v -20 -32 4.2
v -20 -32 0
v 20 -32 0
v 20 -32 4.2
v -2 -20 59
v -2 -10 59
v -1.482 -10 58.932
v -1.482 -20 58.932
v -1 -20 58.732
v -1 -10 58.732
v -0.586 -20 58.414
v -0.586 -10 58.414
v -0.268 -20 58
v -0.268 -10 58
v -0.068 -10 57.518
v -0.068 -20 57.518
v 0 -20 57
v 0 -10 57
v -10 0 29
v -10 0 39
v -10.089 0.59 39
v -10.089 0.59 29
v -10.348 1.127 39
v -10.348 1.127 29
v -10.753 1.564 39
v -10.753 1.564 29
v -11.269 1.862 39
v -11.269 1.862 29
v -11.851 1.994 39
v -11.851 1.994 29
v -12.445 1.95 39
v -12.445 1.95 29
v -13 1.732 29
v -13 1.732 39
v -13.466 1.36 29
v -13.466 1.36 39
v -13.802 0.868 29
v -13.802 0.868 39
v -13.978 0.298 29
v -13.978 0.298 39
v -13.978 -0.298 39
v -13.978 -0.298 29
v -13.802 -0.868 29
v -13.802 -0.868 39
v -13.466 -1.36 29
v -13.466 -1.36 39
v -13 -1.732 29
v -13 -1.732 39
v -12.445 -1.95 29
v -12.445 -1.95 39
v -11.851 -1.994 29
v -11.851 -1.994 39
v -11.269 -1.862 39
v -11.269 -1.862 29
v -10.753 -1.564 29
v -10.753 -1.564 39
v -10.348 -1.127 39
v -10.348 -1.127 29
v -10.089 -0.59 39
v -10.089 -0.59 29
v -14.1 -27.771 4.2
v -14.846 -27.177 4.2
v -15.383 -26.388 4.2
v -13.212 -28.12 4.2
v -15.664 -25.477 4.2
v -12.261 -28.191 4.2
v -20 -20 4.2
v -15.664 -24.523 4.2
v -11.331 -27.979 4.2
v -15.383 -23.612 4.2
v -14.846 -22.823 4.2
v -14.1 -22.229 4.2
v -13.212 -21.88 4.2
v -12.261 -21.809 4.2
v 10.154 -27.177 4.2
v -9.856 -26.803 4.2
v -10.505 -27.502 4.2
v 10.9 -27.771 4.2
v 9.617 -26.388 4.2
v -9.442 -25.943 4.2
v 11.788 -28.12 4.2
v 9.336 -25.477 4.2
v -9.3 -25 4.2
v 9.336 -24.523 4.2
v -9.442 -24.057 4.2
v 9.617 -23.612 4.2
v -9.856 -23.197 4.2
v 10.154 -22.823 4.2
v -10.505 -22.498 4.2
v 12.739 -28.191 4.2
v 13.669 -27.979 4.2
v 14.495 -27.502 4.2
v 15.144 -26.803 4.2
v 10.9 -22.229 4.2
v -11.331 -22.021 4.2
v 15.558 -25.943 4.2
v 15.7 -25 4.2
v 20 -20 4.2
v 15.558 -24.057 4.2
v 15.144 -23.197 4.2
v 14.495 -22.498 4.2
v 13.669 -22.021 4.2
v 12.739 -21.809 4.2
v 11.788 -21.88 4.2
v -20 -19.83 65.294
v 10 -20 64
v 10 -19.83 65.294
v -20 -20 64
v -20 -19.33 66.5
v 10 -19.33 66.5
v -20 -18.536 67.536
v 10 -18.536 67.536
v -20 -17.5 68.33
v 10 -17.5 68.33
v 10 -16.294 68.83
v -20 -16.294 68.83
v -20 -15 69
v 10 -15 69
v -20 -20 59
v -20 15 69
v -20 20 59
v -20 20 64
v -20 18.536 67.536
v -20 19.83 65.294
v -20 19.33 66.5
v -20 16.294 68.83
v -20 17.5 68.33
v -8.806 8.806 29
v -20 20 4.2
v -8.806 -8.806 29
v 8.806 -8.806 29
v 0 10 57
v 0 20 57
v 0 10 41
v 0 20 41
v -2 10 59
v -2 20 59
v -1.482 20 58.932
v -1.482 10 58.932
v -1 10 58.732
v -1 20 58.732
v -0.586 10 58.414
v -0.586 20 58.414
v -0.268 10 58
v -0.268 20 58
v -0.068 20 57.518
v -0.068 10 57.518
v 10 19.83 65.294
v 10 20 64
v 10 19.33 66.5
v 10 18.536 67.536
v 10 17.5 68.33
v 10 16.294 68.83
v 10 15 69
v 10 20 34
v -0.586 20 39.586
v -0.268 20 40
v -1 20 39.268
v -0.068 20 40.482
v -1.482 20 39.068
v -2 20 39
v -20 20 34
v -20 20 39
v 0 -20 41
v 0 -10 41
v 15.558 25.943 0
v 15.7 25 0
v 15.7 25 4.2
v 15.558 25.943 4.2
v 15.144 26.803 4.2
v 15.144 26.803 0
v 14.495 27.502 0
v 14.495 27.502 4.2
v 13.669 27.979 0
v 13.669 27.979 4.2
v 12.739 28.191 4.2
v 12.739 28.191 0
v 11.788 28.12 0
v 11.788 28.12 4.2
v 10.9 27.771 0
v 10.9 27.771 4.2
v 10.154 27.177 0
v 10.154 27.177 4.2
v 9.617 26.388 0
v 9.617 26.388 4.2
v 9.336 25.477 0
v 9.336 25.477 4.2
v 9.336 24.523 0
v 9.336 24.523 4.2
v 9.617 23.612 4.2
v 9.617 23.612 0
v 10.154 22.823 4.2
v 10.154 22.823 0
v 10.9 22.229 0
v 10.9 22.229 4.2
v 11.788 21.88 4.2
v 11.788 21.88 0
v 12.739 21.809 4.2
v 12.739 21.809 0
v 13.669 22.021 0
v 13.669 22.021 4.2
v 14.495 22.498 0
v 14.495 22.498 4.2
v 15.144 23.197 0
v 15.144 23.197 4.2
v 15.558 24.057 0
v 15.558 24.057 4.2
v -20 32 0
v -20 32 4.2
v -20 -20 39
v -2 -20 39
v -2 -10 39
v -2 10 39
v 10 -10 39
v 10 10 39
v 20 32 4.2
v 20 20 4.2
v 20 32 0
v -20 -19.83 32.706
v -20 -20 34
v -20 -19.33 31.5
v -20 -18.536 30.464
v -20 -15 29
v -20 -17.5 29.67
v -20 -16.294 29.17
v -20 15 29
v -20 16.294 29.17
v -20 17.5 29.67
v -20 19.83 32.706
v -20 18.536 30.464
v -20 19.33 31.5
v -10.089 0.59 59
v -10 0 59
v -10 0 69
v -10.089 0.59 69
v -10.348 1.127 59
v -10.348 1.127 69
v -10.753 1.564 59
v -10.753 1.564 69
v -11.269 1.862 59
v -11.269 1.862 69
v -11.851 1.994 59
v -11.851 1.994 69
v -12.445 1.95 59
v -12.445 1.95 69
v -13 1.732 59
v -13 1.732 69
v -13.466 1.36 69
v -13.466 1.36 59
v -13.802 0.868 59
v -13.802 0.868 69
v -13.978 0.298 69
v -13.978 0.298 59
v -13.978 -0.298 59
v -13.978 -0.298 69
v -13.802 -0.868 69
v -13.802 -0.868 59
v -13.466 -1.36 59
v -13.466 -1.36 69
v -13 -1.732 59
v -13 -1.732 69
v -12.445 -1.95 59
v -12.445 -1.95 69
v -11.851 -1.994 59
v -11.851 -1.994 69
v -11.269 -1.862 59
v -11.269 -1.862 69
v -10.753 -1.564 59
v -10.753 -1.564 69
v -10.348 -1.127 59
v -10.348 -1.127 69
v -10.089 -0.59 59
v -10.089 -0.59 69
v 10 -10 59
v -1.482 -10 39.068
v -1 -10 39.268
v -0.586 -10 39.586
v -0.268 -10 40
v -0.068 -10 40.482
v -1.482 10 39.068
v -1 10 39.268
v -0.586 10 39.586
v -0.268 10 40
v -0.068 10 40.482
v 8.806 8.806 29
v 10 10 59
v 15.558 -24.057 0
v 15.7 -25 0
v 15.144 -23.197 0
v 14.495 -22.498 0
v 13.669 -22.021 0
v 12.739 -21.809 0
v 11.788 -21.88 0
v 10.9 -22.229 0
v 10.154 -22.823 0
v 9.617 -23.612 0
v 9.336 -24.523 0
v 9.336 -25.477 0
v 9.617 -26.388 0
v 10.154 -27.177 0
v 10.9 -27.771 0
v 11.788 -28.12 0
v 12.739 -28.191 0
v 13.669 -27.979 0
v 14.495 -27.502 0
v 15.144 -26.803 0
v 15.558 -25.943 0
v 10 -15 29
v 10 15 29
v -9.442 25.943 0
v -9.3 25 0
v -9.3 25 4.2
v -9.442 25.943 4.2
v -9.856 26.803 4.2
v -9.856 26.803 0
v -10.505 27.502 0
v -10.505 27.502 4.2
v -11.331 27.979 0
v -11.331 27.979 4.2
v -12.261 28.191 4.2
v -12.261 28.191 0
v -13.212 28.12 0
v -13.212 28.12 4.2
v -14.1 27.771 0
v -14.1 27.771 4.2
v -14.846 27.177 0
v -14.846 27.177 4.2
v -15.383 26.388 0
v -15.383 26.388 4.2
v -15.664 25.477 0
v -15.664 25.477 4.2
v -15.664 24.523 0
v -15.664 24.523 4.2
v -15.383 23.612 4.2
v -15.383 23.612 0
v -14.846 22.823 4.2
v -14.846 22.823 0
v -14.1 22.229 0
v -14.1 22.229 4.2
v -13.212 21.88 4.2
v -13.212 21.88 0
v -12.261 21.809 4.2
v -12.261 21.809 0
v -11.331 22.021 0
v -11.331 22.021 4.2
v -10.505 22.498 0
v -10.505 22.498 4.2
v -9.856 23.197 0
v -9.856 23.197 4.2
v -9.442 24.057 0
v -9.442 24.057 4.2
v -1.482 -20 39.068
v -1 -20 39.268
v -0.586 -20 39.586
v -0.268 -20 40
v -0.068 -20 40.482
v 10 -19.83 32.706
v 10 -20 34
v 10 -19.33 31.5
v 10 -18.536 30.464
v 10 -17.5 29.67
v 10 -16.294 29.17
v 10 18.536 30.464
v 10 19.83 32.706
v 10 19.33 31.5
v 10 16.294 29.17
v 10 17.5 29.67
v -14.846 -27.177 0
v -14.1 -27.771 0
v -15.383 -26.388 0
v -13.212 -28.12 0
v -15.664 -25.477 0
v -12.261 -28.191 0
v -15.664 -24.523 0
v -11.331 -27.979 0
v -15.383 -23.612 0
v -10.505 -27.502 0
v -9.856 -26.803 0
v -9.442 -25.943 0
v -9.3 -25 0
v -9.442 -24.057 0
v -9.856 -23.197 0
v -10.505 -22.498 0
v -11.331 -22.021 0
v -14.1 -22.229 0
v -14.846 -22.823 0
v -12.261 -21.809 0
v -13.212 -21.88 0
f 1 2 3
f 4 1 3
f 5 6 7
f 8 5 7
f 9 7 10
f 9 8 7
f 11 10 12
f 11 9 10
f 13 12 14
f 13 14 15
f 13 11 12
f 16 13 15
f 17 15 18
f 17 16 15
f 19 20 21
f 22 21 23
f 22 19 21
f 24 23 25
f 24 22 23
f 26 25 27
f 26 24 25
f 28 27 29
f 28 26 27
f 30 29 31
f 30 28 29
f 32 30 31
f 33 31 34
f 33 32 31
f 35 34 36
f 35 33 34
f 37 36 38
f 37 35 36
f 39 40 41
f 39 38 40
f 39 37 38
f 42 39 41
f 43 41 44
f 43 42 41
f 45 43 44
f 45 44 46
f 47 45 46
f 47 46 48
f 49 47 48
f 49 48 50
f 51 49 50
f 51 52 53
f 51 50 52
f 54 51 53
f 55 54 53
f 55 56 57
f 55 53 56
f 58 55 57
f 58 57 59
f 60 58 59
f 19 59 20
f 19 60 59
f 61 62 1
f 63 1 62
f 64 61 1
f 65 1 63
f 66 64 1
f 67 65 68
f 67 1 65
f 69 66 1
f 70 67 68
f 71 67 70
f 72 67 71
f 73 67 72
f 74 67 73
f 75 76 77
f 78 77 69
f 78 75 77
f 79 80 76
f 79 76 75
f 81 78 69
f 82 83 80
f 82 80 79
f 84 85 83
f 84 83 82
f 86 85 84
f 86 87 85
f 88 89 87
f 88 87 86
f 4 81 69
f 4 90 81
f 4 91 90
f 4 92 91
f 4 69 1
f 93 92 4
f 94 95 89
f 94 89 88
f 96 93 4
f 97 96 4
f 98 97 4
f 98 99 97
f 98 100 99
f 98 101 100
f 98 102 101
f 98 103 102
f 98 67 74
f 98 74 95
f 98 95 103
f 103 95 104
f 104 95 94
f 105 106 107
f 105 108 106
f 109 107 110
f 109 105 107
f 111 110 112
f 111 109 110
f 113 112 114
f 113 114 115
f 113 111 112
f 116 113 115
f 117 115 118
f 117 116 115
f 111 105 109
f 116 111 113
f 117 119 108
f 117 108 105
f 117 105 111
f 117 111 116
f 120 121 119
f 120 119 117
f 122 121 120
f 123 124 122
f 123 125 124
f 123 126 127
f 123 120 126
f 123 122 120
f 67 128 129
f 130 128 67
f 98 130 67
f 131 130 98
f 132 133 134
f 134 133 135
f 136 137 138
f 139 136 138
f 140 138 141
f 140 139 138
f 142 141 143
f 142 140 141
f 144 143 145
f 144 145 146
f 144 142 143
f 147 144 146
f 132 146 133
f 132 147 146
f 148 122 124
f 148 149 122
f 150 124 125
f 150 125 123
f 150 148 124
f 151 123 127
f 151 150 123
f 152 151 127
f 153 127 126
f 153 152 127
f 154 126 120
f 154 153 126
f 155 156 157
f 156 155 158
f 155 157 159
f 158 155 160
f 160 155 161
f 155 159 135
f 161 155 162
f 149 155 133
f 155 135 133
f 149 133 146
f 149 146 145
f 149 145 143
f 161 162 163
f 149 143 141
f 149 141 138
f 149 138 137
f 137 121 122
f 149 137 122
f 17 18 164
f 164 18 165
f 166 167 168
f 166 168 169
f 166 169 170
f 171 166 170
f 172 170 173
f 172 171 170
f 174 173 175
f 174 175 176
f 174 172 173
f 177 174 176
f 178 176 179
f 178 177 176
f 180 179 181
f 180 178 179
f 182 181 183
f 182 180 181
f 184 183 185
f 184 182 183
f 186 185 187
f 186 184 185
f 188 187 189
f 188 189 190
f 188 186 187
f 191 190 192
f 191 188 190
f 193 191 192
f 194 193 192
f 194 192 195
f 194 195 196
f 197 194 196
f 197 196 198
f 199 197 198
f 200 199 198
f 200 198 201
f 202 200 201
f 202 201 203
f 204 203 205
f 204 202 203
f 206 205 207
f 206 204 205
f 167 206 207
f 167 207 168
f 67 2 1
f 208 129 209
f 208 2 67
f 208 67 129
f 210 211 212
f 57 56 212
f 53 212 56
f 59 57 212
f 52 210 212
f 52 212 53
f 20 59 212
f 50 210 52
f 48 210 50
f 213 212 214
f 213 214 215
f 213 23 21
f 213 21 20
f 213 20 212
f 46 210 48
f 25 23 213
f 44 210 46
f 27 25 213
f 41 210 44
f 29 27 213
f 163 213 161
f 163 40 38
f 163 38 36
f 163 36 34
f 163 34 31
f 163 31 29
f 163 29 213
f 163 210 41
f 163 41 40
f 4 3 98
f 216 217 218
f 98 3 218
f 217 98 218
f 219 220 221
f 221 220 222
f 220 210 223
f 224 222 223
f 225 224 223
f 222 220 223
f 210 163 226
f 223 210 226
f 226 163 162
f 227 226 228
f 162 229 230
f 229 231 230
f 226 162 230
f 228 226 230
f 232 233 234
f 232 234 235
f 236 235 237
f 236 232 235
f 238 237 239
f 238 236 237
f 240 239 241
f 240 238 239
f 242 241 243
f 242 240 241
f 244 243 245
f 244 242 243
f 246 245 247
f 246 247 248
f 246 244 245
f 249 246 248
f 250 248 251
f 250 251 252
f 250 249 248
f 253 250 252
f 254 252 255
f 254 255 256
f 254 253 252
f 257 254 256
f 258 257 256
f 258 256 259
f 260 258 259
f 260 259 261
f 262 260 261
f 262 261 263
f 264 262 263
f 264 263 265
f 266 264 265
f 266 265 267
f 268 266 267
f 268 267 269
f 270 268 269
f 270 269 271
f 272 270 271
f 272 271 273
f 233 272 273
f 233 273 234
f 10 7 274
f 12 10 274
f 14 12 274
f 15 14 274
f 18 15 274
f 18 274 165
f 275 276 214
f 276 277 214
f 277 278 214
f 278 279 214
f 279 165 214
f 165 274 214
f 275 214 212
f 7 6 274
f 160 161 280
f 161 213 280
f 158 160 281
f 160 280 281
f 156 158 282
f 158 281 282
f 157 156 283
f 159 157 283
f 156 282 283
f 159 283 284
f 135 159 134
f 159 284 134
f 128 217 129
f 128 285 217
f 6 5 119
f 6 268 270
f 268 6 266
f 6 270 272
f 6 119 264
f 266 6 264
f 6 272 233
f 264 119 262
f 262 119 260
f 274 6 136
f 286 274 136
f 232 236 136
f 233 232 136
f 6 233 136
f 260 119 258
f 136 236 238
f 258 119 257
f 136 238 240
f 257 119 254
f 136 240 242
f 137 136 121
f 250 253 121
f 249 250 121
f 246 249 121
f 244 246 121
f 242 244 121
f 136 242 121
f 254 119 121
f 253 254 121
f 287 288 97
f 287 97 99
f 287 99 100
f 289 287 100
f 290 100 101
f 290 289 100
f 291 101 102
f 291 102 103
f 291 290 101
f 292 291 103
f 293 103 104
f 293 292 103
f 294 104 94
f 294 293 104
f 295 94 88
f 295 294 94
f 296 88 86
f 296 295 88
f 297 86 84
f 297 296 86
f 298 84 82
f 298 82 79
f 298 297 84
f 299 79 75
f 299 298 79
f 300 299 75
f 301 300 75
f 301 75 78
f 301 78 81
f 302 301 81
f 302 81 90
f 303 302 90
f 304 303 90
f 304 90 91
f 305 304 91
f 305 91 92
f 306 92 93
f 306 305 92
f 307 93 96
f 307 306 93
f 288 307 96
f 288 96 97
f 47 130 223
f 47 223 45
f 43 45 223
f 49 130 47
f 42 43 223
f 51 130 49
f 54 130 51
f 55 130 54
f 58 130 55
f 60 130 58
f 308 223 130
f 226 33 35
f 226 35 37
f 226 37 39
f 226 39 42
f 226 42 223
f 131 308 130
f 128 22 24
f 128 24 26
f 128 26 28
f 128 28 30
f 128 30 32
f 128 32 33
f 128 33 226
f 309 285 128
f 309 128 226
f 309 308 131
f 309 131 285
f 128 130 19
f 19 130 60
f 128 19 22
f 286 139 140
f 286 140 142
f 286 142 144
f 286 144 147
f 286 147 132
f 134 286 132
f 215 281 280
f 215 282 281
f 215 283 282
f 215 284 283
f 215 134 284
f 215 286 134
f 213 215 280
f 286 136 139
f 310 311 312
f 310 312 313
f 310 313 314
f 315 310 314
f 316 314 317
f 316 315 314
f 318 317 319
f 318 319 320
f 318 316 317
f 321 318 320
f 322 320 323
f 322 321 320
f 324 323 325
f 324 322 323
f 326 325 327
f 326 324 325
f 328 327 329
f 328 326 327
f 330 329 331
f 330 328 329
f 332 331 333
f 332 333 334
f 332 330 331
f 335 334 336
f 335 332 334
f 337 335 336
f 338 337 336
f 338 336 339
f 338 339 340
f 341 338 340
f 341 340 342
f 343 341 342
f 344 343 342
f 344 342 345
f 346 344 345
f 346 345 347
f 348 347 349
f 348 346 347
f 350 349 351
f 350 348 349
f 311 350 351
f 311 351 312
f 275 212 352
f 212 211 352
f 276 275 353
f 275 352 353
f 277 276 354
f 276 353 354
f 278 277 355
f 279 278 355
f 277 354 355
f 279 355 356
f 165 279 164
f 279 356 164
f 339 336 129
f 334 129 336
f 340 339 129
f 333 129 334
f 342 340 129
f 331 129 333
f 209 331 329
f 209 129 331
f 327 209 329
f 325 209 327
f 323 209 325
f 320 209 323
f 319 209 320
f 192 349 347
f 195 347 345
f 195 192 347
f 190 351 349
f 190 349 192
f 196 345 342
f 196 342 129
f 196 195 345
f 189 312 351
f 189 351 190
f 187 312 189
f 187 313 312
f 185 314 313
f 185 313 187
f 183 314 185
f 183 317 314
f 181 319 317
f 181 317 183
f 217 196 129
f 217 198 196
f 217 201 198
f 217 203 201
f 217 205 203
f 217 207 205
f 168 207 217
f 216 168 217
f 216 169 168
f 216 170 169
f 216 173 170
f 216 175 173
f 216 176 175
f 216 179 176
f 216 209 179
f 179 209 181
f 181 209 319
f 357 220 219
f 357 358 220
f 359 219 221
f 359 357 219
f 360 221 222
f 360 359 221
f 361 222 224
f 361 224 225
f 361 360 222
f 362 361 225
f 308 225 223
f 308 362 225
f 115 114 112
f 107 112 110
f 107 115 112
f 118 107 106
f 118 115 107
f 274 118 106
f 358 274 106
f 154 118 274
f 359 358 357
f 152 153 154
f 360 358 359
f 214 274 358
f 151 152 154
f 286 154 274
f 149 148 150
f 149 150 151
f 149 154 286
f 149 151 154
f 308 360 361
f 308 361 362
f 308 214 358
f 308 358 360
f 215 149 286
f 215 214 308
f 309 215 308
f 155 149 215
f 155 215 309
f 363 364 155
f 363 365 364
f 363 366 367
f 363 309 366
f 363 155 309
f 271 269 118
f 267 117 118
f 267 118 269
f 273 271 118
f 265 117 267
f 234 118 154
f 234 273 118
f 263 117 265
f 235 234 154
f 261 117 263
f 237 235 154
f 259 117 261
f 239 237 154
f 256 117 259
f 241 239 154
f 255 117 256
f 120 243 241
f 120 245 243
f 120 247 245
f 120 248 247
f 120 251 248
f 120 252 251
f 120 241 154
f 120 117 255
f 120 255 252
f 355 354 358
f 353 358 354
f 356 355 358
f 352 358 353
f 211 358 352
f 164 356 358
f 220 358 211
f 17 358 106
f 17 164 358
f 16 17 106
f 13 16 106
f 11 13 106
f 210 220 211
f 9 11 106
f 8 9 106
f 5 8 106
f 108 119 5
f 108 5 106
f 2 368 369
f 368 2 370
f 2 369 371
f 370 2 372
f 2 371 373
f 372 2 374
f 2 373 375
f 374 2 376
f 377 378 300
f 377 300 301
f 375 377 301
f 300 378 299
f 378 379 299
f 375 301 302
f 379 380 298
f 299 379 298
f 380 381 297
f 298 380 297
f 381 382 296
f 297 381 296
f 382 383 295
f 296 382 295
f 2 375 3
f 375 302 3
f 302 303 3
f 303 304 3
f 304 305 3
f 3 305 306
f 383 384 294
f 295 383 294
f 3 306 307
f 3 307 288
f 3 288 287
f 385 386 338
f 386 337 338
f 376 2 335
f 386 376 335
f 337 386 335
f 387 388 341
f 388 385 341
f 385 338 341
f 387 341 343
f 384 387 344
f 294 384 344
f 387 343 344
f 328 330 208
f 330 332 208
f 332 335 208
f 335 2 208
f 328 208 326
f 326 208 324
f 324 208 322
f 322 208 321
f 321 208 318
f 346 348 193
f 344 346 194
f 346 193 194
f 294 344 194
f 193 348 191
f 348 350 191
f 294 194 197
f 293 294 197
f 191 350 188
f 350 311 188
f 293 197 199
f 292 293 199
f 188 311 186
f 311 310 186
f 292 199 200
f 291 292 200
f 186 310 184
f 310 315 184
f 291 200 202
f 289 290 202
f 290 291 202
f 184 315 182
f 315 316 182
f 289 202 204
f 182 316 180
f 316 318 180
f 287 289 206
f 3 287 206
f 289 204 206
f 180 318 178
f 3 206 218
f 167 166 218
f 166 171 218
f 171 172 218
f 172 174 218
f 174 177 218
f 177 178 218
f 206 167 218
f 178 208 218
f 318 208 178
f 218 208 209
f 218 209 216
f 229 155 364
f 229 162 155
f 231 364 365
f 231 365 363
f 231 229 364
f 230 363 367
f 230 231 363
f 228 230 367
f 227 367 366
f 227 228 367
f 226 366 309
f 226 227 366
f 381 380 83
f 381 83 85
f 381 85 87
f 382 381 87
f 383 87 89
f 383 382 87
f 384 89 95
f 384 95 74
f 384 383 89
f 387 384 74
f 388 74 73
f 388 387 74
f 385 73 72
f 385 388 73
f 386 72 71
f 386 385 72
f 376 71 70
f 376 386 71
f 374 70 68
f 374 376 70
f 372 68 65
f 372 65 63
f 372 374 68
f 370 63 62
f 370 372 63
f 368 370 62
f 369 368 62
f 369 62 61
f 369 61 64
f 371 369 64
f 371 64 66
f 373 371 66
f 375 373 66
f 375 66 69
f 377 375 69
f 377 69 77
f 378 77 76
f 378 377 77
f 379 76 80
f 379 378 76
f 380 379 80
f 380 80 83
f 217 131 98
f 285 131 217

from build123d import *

# Parameters (mm, degrees)
SKETCH_1_W           = 40
SKETCH_1_H           = 64
SKETCH_1_R           = 3.2
EXTRUDE_1_DEPTH      = 4.2
SKETCH_2_R           = 16
SKETCH_2_W           = 20
SKETCH_2_H           = 20
EXTRUDE_2_DEPTH      = 10
EXTRUDE_2_DEPTH_BACK = 20
SKETCH_3_W           = 20
SKETCH_3_H           = 32
CUT_EXTRUDE_1_DEPTH  = 20
EXTRUDE_3_DEPTH      = 3
SKETCH_7_W           = 14
SKETCH_7_H           = 6
EXTRUDE_4_DEPTH      = 0.283766
EXTRUDE_5_DEPTH      = 3
SKETCH_9_W           = 6
SKETCH_9_H           = 14
EXTRUDE_6_DEPTH      = 1.612505
SKETCH_10_W          = 40
SKETCH_10_H          = 40
SKETCH_11_W          = 14
SKETCH_11_H          = 14
SKETCH_12_W          = 14
SKETCH_12_H          = 14
EXTRUDE_8_DEPTH      = 6
SKETCH_14_W          = 40
SKETCH_14_H          = 40
SKETCH_14_W_2        = 20
SKETCH_14_H_2        = 20
EXTRUDE_10_DEPTH     = 10
SKETCH_15_W          = 10
SKETCH_15_H          = 40
EXTRUDE_11_DEPTH     = 20
CUT_EXTRUDE_START    = -10
SKETCH_4_R           = 2
CUT_EXTRUDE_2_DEPTH  = 40
FILLET_2_R           = 5
FILLET_3_R           = 2


with BuildPart() as part:
    # 스케치1 → 보스-돌출1 (new body)
    with BuildSketch(Plane.XY):
        Rectangle(SKETCH_1_W, SKETCH_1_H)
        with Locations((-12.5, 25)):
            Circle(SKETCH_1_R, mode=Mode.SUBTRACT)
        with Locations((12.5, 25)):
            Circle(SKETCH_1_R, mode=Mode.SUBTRACT)
        with Locations((12.5, -25)):
            Circle(SKETCH_1_R, mode=Mode.SUBTRACT)
        with Locations((-12.5, -25)):
            Circle(SKETCH_1_R, mode=Mode.SUBTRACT)
    extrude(amount=EXTRUDE_1_DEPTH)

    # 스케치5 → 보스-돌출3 (add, symmetric)
    with BuildSketch(Plane(origin=(0, 0, 0), x_dir=(1, 0, 0), z_dir=(0, 1, 0))):
        Polygon((-20, -4.2), (-7, -33), (7, -33), (20, -4.2), align=None)
        Polygon((-13.805819277, -8.2), (-4, -8.2), (-4, -29.923661167), align=None, mode=Mode.SUBTRACT)
        Polygon((4, -29.923661167), (13.805819277, -8.2), (4, -8.2), align=None, mode=Mode.SUBTRACT)
    extrude(amount=EXTRUDE_3_DEPTH, both=True)



with BuildPart() as body_2:
    # 스케치2 → 보스-돌출2 (new body, two sides)
    with BuildSketch(Plane(origin=(0, 0, 0), x_dir=(0, 0, -1), z_dir=(1, 0, 0))) as extrude_2_sk:
        with Locations((-49, 0)):
            Circle(SKETCH_2_R)
        with Locations((-49, 0)):
            Rectangle(SKETCH_2_W, SKETCH_2_H, mode=Mode.SUBTRACT)
    extrude(amount=EXTRUDE_2_DEPTH)
    extrude(extrude_2_sk.sketch, amount=-EXTRUDE_2_DEPTH_BACK)

    # 스케치3 → 컷-돌출1 (cut)
    with BuildSketch(Plane.ZY.offset(20)):
        with Locations((49, 0)):
            Rectangle(SKETCH_3_W, SKETCH_3_H)
    extrude(amount=-CUT_EXTRUDE_1_DEPTH, mode=Mode.SUBTRACT)


with BuildPart() as part_1:
    add(part.part)

    add(body_2.part)  # 보스-돌출4 merges body 2
    # 스케치7 → 보스-돌출4 (add)
    with BuildSketch(Plane.XY.offset(33)):
        Rectangle(SKETCH_7_W, SKETCH_7_H)
    extrude(amount=EXTRUDE_4_DEPTH)

    # 스케치8 → 보스-돌출5 (add, symmetric)
    with BuildSketch(Plane(origin=(0, 0, 0), x_dir=(0, 0, -1), z_dir=(1, 0, 0))):
        Polygon((-4.2, 20), (-33, 7), (-33, -7), (-4.2, -20), align=None)
        Polygon((-8.2, 13.805819277), (-8.2, 4), (-29.923661167, 4), align=None, mode=Mode.SUBTRACT)
        Polygon((-8.2, -4), (-29.923661167, -4), (-8.2, -13.805819277), align=None, mode=Mode.SUBTRACT)
    extrude(amount=EXTRUDE_5_DEPTH, both=True)

    # 스케치9 → 보스-돌출6 (add)
    with BuildSketch(Plane.XY.offset(33)):
        Rectangle(SKETCH_9_W, SKETCH_9_H)
    extrude(amount=EXTRUDE_6_DEPTH)

    # 스케치10 → 로프트1 section 0
    with BuildSketch(Plane.XY.offset(4.2)):
        Rectangle(SKETCH_10_W, SKETCH_10_H)
    # 스케치11 → 로프트1 section 1
    with BuildSketch(Plane.XY.offset(33)):
        Rectangle(SKETCH_11_W, SKETCH_11_H)
    loft()

    # 스케치12 → 보스-돌출8 (add)
    with BuildSketch(Plane.XY.offset(33)):
        Rectangle(SKETCH_12_W, SKETCH_12_H)
    extrude(amount=EXTRUDE_8_DEPTH)

    # 스케치14 → 보스-돌출10 (add)
    with BuildSketch(Plane(origin=(10, 0, 0), x_dir=(0, 0, -1), z_dir=(1, 0, 0))):
        with Locations((-49, 0)):
            Rectangle(SKETCH_14_W, SKETCH_14_H)
        with Locations((-49, 0)):
            Rectangle(SKETCH_14_W_2, SKETCH_14_H_2, mode=Mode.SUBTRACT)
    extrude(amount=-EXTRUDE_10_DEPTH)

    # 스케치15 → 보스-돌출11 (add)
    with BuildSketch(Plane.ZY.offset(20)):
        with Locations((64, 0)):
            Rectangle(SKETCH_15_W, SKETCH_15_H)
        with Locations((34, 0)):
            Rectangle(SKETCH_15_W, SKETCH_15_H)
    extrude(amount=-EXTRUDE_11_DEPTH)

    # 스케치4 → 컷-돌출2 (cut)
    with BuildSketch(Plane.XY.offset(39).offset(CUT_EXTRUDE_START)):
        with Locations((-12, 0)):
            Circle(SKETCH_4_R)
    extrude(amount=CUT_EXTRUDE_2_DEPTH, mode=Mode.SUBTRACT)

    # 필렛2
    fillet_2_edges = [part_1.edges().sort_by_distance(p)[0] for p in [
        (-5, 20, 29),
        (-5, -20, 29),
        (-5, -20, 69),
        (-5, 20, 69),
    ]]
    fillet(fillet_2_edges, radius=FILLET_2_R)

    # 필렛3
    fillet_3_edges = [part_1.edges().sort_by_distance(p)[0] for p in [
        (0, 15, 39),
        (0, -15, 39),
        (0, 15, 59),
        (0, -15, 59),
    ]]
    fillet(fillet_3_edges, radius=FILLET_3_R)


solid = part_1.part
